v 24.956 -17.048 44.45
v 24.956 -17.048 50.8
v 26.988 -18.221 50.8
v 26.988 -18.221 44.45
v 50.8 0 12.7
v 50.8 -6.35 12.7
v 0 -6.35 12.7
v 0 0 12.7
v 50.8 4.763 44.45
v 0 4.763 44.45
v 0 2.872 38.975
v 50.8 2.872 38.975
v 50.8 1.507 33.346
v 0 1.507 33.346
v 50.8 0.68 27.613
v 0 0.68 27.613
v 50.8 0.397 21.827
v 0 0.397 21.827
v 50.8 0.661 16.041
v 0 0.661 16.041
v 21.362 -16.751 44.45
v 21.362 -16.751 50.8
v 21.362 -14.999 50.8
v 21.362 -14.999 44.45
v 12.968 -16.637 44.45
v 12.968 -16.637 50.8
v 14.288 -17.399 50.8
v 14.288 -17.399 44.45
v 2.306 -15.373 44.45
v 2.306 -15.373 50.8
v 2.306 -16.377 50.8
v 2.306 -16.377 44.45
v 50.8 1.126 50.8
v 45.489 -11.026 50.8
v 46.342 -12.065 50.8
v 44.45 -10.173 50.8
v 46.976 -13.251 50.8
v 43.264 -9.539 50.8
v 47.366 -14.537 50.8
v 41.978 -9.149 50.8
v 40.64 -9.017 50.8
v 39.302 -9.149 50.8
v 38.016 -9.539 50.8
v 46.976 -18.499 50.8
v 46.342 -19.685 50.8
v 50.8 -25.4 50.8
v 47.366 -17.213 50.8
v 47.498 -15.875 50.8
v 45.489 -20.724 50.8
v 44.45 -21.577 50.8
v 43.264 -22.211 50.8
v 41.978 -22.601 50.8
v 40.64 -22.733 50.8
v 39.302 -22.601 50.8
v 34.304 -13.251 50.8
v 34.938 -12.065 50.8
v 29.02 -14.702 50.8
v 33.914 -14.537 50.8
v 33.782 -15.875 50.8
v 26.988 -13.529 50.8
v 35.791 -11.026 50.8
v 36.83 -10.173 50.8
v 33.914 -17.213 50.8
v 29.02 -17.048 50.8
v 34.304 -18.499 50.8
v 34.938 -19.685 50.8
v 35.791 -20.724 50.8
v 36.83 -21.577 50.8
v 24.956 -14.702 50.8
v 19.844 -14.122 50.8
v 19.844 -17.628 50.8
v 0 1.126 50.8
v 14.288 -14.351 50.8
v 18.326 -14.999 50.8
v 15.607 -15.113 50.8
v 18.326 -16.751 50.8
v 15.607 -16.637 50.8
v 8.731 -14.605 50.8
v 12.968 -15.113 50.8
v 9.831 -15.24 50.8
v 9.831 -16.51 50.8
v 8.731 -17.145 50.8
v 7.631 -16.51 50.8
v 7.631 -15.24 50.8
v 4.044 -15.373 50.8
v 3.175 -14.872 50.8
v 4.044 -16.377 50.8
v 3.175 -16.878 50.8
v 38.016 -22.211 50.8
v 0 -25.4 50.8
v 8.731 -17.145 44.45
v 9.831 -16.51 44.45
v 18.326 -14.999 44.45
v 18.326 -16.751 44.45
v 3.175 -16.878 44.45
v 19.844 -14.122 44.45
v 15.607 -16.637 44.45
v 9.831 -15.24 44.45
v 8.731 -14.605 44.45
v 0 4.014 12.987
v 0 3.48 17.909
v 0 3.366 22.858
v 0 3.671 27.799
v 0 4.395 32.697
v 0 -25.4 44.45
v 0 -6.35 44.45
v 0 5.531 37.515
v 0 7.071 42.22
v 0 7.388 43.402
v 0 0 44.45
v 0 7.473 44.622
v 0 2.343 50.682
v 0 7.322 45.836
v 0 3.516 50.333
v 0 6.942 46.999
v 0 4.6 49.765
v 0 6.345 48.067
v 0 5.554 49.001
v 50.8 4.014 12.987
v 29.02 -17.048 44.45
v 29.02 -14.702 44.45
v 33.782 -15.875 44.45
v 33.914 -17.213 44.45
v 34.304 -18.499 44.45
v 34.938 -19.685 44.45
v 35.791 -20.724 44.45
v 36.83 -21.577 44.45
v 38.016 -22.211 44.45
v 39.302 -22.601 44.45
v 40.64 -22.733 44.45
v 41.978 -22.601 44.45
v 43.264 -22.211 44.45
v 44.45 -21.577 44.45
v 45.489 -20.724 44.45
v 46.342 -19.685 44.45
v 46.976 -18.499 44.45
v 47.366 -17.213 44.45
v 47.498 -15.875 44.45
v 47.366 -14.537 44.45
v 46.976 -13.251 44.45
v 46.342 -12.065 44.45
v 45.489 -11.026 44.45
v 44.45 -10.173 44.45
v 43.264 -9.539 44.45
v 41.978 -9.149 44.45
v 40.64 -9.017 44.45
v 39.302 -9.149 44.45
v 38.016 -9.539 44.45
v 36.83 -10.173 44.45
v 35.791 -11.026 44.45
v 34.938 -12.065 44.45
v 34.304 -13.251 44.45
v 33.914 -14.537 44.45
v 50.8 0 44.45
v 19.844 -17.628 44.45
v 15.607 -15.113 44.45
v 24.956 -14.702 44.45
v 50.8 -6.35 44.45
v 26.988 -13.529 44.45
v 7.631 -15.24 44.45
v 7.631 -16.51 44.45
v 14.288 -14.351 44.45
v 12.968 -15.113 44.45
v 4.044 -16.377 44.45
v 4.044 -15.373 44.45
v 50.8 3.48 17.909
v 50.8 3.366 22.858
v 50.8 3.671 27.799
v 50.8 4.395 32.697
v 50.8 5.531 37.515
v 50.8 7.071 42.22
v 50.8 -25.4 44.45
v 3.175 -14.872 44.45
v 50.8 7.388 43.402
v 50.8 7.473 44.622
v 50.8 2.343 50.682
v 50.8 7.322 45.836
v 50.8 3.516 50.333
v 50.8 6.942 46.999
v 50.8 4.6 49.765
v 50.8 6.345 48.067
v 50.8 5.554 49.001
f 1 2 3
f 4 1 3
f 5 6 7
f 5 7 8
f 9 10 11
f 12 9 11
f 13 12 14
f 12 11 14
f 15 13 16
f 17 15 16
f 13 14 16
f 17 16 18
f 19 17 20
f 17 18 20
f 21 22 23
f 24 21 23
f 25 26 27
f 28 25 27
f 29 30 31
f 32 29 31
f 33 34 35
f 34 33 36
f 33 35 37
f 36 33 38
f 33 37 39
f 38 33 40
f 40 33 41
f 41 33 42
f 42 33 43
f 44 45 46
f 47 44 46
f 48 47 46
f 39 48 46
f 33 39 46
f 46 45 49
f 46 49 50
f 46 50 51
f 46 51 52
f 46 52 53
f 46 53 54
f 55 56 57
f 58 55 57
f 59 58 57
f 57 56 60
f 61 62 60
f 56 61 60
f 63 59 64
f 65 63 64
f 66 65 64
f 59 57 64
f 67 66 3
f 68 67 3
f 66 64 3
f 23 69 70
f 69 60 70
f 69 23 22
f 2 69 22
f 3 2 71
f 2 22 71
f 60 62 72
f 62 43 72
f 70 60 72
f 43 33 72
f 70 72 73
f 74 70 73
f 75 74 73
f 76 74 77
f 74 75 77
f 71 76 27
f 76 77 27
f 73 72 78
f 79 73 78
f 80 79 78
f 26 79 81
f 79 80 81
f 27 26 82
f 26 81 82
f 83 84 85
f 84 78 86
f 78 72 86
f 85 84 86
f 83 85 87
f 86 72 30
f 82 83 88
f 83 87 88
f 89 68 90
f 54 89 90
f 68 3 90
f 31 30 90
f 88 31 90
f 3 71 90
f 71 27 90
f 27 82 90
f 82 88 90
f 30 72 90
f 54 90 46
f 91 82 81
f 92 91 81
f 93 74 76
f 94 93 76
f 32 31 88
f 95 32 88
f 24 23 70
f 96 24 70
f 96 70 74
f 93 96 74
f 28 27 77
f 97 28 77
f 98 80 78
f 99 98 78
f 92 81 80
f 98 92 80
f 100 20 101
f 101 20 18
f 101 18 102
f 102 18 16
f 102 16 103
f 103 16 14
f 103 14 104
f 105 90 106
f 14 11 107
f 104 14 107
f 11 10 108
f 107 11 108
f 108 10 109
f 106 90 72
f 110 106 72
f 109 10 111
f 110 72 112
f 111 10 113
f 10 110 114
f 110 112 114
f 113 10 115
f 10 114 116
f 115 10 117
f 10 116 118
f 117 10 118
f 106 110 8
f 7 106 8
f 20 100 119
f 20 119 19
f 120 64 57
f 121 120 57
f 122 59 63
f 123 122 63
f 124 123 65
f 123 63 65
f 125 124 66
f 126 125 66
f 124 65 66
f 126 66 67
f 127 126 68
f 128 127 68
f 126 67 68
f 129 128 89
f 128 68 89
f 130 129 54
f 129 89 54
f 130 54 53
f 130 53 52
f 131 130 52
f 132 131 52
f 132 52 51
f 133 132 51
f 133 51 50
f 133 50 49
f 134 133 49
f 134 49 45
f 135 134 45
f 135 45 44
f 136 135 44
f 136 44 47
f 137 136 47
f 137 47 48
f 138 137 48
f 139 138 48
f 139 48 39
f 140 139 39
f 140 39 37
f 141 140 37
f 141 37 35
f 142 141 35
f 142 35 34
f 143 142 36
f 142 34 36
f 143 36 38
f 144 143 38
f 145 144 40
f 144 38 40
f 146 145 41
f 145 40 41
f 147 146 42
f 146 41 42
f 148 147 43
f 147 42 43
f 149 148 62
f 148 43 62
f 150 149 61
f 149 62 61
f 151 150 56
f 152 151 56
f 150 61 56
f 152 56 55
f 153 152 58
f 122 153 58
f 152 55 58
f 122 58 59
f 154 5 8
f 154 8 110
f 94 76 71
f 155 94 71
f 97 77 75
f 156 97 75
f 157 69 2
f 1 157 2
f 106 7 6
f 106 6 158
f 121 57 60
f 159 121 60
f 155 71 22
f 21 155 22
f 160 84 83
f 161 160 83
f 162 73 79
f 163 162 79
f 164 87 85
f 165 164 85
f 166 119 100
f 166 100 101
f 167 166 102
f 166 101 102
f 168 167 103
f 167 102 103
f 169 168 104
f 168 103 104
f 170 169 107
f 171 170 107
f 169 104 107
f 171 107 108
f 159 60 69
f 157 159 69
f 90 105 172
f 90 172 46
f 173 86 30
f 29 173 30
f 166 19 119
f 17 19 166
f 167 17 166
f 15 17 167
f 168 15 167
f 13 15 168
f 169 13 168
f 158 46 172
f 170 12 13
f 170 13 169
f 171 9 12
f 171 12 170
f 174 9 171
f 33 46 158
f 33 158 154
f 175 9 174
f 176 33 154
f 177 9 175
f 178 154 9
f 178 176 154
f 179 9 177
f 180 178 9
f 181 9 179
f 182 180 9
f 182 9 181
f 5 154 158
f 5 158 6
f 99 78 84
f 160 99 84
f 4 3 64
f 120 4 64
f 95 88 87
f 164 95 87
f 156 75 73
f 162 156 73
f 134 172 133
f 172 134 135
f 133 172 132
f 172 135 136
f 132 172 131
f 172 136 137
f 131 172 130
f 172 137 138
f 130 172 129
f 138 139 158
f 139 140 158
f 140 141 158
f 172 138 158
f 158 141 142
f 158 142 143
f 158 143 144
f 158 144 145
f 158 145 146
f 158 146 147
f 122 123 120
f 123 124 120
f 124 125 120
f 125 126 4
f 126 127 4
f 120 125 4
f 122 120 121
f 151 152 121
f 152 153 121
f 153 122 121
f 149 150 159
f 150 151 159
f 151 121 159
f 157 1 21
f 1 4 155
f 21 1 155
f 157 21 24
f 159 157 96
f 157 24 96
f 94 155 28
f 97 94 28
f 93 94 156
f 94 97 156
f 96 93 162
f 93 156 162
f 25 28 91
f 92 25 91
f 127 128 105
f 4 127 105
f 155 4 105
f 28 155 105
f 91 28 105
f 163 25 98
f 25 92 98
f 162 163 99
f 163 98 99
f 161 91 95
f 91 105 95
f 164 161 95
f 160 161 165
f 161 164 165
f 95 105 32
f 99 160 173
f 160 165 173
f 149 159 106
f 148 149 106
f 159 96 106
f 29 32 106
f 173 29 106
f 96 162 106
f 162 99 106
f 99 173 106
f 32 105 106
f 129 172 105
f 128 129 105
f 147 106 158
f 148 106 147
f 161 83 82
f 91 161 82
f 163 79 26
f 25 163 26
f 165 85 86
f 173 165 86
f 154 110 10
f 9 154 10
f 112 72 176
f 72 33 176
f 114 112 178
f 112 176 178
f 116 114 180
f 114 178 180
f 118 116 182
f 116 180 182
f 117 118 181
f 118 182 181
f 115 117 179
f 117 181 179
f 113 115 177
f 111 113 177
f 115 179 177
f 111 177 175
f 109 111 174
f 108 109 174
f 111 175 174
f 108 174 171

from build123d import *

# Parameters (mm, degrees)
F0_W        = 19.05
F0_H        = 6.35
F0_W_2      = 6.35
F0_H_2      = 31.75
F1_DEPTH    = 50.8
F3_DEPTH    = 38.101
F4_R        = 6.35
F5_T1_DEPTH = 68.1131376889


# Not quite as in the source:
# - a fillet or chamfer that OpenCascade refuses, or shapes differently, is made with other operations: its cross-section is extruded or revolved along the edge and cut away or added


with BuildPart() as f1:
    # F0 (on Right) → F1 (new body)
    with BuildSketch(Plane.YZ):
        with Locations((-15.875, 47.625)):
            Rectangle(F0_W, F0_H)
        with Locations((-3.175, 47.625)):
            Rectangle(F0_W_2, F0_H)
        with Locations((-3.175, 28.575)):
            Rectangle(F0_W_2, F0_H_2)
        with BuildLine():
            Line((0, 50.8), (0, 44.45))
            Line((0, 44.45), (4.7625, 44.45))
            ThreePointArc((4.7625, 44.45), (0.8082593776, 28.8201935432), (1.0656091525, 12.7))
            Line((1.0656091525, 12.7), (4.0578971116, 12.7))
            ThreePointArc((4.0578971116, 12.7), (4.3300087855, 32.3527315264), (11.1125, 50.8))
            Line((11.1125, 50.8), (0, 50.8))
        make_face()
    extrude(amount=F1_DEPTH)

    # F2 (on face) → F3 (cut, through all)
    with BuildSketch(Plane.XY.offset(50.8)):
        Polygon((2.3061167124, -15.875), (3.175, -15.875), (4.0438832876, -15.875), (4.0438832876, -15.37335), (3.175, -14.8717), (2.3061167124, -15.37335), align=None)
        Polygon((4.0438832876, -15.875), (3.175, -15.875), (2.3061167124, -15.875), (2.3061167124, -16.37665), (3.175, -16.8783), (4.0438832876, -16.37665), align=None)
        with BuildLine():
            ThreePointArc((47.498, -15.875), (40.64, -9.017), (33.782, -15.875))
            Line((33.782, -15.875), (40.64, -15.875))
            Line((40.64, -15.875), (47.498, -15.875))
        make_face()
        with BuildLine():
            Line((40.64, -15.875), (33.782, -15.875))
            ThreePointArc((33.782, -15.875), (40.64, -22.733), (47.498, -15.875))
            Line((47.498, -15.875), (40.64, -15.875))
        make_face()
        Polygon((24.9555, -14.701824253), (24.9555, -15.875), (26.9875, -15.875), (29.0195, -15.875), (29.0195, -14.701824253), (26.9875, -13.528648506), align=None)
        Polygon((26.9875, -15.875), (24.9555, -15.875), (24.9555, -17.048175747), (26.9875, -18.221351494), (29.0195, -17.048175747), (29.0195, -15.875), align=None)
        Polygon((18.3259538773, -14.9987), (18.3259538773, -15.875), (19.84375, -15.875), (21.3615461227, -15.875), (21.3615461227, -14.9987), (19.84375, -14.1224), align=None)
        Polygon((19.84375, -15.875), (18.3259538773, -15.875), (18.3259538773, -16.7513), (19.84375, -17.6276), (21.3615461227, -16.7513), (21.3615461227, -15.875), align=None)
        Polygon((12.9676772846, -15.113), (12.9676772846, -15.875), (14.2875, -15.875), (15.6073227154, -15.875), (15.6073227154, -15.113), (14.2875, -14.351), align=None)
        Polygon((14.2875, -15.875), (12.9676772846, -15.875), (12.9676772846, -16.637), (14.2875, -17.399), (15.6073227154, -16.637), (15.6073227154, -15.875), align=None)
        Polygon((7.6313977372, -15.24), (7.6313977372, -15.875), (8.73125, -15.875), (9.8311022628, -15.875), (9.8311022628, -15.24), (8.73125, -14.605), align=None)
        Polygon((8.73125, -15.875), (7.6313977372, -15.875), (7.6313977372, -16.51), (8.73125, -17.145), (9.8311022628, -16.51), (9.8311022628, -15.875), align=None)
    extrude(amount=-F3_DEPTH, mode=Mode.SUBTRACT)

    # F4
    f4_edges = [f1.edges().sort_by_distance(p)[0] for p in [
        (25.4, 11.1125, 50.8),
    ]]
    fillet(f4_edges, radius=F4_R)

    # F5: chamfer of 3.175 on 1 edges, made by hand

    # F5_s2 → F5_t1 (cut)
    with BuildSketch(Plane.YZ.offset(-8.6565688444)):
        with BuildLine():
            Line((4.422273237, 12.6144658264), (0.5675477916, 16.1266199594))
            Line((0.5675477916, 16.1266199594), (0.5043218231, 16.1207270056))
            ThreePointArc((0.5043218231, 16.1207270056), (0.7717830499, 14.4079265456), (1.0028018544, 12.690646214))
            Line((1.0028018544, 12.690646214), (1.0656091525, 12.6365))
            ThreePointArc((1.0656091525, 12.6365), (2.7439411948, 12.6365), (4.422273237, 12.5509658264))
            Line((4.422273237, 12.5509658264), (4.422273237, 12.6144658264))
        make_face()
    extrude(amount=F5_T1_DEPTH, mode=Mode.SUBTRACT)


solid = f1.part
